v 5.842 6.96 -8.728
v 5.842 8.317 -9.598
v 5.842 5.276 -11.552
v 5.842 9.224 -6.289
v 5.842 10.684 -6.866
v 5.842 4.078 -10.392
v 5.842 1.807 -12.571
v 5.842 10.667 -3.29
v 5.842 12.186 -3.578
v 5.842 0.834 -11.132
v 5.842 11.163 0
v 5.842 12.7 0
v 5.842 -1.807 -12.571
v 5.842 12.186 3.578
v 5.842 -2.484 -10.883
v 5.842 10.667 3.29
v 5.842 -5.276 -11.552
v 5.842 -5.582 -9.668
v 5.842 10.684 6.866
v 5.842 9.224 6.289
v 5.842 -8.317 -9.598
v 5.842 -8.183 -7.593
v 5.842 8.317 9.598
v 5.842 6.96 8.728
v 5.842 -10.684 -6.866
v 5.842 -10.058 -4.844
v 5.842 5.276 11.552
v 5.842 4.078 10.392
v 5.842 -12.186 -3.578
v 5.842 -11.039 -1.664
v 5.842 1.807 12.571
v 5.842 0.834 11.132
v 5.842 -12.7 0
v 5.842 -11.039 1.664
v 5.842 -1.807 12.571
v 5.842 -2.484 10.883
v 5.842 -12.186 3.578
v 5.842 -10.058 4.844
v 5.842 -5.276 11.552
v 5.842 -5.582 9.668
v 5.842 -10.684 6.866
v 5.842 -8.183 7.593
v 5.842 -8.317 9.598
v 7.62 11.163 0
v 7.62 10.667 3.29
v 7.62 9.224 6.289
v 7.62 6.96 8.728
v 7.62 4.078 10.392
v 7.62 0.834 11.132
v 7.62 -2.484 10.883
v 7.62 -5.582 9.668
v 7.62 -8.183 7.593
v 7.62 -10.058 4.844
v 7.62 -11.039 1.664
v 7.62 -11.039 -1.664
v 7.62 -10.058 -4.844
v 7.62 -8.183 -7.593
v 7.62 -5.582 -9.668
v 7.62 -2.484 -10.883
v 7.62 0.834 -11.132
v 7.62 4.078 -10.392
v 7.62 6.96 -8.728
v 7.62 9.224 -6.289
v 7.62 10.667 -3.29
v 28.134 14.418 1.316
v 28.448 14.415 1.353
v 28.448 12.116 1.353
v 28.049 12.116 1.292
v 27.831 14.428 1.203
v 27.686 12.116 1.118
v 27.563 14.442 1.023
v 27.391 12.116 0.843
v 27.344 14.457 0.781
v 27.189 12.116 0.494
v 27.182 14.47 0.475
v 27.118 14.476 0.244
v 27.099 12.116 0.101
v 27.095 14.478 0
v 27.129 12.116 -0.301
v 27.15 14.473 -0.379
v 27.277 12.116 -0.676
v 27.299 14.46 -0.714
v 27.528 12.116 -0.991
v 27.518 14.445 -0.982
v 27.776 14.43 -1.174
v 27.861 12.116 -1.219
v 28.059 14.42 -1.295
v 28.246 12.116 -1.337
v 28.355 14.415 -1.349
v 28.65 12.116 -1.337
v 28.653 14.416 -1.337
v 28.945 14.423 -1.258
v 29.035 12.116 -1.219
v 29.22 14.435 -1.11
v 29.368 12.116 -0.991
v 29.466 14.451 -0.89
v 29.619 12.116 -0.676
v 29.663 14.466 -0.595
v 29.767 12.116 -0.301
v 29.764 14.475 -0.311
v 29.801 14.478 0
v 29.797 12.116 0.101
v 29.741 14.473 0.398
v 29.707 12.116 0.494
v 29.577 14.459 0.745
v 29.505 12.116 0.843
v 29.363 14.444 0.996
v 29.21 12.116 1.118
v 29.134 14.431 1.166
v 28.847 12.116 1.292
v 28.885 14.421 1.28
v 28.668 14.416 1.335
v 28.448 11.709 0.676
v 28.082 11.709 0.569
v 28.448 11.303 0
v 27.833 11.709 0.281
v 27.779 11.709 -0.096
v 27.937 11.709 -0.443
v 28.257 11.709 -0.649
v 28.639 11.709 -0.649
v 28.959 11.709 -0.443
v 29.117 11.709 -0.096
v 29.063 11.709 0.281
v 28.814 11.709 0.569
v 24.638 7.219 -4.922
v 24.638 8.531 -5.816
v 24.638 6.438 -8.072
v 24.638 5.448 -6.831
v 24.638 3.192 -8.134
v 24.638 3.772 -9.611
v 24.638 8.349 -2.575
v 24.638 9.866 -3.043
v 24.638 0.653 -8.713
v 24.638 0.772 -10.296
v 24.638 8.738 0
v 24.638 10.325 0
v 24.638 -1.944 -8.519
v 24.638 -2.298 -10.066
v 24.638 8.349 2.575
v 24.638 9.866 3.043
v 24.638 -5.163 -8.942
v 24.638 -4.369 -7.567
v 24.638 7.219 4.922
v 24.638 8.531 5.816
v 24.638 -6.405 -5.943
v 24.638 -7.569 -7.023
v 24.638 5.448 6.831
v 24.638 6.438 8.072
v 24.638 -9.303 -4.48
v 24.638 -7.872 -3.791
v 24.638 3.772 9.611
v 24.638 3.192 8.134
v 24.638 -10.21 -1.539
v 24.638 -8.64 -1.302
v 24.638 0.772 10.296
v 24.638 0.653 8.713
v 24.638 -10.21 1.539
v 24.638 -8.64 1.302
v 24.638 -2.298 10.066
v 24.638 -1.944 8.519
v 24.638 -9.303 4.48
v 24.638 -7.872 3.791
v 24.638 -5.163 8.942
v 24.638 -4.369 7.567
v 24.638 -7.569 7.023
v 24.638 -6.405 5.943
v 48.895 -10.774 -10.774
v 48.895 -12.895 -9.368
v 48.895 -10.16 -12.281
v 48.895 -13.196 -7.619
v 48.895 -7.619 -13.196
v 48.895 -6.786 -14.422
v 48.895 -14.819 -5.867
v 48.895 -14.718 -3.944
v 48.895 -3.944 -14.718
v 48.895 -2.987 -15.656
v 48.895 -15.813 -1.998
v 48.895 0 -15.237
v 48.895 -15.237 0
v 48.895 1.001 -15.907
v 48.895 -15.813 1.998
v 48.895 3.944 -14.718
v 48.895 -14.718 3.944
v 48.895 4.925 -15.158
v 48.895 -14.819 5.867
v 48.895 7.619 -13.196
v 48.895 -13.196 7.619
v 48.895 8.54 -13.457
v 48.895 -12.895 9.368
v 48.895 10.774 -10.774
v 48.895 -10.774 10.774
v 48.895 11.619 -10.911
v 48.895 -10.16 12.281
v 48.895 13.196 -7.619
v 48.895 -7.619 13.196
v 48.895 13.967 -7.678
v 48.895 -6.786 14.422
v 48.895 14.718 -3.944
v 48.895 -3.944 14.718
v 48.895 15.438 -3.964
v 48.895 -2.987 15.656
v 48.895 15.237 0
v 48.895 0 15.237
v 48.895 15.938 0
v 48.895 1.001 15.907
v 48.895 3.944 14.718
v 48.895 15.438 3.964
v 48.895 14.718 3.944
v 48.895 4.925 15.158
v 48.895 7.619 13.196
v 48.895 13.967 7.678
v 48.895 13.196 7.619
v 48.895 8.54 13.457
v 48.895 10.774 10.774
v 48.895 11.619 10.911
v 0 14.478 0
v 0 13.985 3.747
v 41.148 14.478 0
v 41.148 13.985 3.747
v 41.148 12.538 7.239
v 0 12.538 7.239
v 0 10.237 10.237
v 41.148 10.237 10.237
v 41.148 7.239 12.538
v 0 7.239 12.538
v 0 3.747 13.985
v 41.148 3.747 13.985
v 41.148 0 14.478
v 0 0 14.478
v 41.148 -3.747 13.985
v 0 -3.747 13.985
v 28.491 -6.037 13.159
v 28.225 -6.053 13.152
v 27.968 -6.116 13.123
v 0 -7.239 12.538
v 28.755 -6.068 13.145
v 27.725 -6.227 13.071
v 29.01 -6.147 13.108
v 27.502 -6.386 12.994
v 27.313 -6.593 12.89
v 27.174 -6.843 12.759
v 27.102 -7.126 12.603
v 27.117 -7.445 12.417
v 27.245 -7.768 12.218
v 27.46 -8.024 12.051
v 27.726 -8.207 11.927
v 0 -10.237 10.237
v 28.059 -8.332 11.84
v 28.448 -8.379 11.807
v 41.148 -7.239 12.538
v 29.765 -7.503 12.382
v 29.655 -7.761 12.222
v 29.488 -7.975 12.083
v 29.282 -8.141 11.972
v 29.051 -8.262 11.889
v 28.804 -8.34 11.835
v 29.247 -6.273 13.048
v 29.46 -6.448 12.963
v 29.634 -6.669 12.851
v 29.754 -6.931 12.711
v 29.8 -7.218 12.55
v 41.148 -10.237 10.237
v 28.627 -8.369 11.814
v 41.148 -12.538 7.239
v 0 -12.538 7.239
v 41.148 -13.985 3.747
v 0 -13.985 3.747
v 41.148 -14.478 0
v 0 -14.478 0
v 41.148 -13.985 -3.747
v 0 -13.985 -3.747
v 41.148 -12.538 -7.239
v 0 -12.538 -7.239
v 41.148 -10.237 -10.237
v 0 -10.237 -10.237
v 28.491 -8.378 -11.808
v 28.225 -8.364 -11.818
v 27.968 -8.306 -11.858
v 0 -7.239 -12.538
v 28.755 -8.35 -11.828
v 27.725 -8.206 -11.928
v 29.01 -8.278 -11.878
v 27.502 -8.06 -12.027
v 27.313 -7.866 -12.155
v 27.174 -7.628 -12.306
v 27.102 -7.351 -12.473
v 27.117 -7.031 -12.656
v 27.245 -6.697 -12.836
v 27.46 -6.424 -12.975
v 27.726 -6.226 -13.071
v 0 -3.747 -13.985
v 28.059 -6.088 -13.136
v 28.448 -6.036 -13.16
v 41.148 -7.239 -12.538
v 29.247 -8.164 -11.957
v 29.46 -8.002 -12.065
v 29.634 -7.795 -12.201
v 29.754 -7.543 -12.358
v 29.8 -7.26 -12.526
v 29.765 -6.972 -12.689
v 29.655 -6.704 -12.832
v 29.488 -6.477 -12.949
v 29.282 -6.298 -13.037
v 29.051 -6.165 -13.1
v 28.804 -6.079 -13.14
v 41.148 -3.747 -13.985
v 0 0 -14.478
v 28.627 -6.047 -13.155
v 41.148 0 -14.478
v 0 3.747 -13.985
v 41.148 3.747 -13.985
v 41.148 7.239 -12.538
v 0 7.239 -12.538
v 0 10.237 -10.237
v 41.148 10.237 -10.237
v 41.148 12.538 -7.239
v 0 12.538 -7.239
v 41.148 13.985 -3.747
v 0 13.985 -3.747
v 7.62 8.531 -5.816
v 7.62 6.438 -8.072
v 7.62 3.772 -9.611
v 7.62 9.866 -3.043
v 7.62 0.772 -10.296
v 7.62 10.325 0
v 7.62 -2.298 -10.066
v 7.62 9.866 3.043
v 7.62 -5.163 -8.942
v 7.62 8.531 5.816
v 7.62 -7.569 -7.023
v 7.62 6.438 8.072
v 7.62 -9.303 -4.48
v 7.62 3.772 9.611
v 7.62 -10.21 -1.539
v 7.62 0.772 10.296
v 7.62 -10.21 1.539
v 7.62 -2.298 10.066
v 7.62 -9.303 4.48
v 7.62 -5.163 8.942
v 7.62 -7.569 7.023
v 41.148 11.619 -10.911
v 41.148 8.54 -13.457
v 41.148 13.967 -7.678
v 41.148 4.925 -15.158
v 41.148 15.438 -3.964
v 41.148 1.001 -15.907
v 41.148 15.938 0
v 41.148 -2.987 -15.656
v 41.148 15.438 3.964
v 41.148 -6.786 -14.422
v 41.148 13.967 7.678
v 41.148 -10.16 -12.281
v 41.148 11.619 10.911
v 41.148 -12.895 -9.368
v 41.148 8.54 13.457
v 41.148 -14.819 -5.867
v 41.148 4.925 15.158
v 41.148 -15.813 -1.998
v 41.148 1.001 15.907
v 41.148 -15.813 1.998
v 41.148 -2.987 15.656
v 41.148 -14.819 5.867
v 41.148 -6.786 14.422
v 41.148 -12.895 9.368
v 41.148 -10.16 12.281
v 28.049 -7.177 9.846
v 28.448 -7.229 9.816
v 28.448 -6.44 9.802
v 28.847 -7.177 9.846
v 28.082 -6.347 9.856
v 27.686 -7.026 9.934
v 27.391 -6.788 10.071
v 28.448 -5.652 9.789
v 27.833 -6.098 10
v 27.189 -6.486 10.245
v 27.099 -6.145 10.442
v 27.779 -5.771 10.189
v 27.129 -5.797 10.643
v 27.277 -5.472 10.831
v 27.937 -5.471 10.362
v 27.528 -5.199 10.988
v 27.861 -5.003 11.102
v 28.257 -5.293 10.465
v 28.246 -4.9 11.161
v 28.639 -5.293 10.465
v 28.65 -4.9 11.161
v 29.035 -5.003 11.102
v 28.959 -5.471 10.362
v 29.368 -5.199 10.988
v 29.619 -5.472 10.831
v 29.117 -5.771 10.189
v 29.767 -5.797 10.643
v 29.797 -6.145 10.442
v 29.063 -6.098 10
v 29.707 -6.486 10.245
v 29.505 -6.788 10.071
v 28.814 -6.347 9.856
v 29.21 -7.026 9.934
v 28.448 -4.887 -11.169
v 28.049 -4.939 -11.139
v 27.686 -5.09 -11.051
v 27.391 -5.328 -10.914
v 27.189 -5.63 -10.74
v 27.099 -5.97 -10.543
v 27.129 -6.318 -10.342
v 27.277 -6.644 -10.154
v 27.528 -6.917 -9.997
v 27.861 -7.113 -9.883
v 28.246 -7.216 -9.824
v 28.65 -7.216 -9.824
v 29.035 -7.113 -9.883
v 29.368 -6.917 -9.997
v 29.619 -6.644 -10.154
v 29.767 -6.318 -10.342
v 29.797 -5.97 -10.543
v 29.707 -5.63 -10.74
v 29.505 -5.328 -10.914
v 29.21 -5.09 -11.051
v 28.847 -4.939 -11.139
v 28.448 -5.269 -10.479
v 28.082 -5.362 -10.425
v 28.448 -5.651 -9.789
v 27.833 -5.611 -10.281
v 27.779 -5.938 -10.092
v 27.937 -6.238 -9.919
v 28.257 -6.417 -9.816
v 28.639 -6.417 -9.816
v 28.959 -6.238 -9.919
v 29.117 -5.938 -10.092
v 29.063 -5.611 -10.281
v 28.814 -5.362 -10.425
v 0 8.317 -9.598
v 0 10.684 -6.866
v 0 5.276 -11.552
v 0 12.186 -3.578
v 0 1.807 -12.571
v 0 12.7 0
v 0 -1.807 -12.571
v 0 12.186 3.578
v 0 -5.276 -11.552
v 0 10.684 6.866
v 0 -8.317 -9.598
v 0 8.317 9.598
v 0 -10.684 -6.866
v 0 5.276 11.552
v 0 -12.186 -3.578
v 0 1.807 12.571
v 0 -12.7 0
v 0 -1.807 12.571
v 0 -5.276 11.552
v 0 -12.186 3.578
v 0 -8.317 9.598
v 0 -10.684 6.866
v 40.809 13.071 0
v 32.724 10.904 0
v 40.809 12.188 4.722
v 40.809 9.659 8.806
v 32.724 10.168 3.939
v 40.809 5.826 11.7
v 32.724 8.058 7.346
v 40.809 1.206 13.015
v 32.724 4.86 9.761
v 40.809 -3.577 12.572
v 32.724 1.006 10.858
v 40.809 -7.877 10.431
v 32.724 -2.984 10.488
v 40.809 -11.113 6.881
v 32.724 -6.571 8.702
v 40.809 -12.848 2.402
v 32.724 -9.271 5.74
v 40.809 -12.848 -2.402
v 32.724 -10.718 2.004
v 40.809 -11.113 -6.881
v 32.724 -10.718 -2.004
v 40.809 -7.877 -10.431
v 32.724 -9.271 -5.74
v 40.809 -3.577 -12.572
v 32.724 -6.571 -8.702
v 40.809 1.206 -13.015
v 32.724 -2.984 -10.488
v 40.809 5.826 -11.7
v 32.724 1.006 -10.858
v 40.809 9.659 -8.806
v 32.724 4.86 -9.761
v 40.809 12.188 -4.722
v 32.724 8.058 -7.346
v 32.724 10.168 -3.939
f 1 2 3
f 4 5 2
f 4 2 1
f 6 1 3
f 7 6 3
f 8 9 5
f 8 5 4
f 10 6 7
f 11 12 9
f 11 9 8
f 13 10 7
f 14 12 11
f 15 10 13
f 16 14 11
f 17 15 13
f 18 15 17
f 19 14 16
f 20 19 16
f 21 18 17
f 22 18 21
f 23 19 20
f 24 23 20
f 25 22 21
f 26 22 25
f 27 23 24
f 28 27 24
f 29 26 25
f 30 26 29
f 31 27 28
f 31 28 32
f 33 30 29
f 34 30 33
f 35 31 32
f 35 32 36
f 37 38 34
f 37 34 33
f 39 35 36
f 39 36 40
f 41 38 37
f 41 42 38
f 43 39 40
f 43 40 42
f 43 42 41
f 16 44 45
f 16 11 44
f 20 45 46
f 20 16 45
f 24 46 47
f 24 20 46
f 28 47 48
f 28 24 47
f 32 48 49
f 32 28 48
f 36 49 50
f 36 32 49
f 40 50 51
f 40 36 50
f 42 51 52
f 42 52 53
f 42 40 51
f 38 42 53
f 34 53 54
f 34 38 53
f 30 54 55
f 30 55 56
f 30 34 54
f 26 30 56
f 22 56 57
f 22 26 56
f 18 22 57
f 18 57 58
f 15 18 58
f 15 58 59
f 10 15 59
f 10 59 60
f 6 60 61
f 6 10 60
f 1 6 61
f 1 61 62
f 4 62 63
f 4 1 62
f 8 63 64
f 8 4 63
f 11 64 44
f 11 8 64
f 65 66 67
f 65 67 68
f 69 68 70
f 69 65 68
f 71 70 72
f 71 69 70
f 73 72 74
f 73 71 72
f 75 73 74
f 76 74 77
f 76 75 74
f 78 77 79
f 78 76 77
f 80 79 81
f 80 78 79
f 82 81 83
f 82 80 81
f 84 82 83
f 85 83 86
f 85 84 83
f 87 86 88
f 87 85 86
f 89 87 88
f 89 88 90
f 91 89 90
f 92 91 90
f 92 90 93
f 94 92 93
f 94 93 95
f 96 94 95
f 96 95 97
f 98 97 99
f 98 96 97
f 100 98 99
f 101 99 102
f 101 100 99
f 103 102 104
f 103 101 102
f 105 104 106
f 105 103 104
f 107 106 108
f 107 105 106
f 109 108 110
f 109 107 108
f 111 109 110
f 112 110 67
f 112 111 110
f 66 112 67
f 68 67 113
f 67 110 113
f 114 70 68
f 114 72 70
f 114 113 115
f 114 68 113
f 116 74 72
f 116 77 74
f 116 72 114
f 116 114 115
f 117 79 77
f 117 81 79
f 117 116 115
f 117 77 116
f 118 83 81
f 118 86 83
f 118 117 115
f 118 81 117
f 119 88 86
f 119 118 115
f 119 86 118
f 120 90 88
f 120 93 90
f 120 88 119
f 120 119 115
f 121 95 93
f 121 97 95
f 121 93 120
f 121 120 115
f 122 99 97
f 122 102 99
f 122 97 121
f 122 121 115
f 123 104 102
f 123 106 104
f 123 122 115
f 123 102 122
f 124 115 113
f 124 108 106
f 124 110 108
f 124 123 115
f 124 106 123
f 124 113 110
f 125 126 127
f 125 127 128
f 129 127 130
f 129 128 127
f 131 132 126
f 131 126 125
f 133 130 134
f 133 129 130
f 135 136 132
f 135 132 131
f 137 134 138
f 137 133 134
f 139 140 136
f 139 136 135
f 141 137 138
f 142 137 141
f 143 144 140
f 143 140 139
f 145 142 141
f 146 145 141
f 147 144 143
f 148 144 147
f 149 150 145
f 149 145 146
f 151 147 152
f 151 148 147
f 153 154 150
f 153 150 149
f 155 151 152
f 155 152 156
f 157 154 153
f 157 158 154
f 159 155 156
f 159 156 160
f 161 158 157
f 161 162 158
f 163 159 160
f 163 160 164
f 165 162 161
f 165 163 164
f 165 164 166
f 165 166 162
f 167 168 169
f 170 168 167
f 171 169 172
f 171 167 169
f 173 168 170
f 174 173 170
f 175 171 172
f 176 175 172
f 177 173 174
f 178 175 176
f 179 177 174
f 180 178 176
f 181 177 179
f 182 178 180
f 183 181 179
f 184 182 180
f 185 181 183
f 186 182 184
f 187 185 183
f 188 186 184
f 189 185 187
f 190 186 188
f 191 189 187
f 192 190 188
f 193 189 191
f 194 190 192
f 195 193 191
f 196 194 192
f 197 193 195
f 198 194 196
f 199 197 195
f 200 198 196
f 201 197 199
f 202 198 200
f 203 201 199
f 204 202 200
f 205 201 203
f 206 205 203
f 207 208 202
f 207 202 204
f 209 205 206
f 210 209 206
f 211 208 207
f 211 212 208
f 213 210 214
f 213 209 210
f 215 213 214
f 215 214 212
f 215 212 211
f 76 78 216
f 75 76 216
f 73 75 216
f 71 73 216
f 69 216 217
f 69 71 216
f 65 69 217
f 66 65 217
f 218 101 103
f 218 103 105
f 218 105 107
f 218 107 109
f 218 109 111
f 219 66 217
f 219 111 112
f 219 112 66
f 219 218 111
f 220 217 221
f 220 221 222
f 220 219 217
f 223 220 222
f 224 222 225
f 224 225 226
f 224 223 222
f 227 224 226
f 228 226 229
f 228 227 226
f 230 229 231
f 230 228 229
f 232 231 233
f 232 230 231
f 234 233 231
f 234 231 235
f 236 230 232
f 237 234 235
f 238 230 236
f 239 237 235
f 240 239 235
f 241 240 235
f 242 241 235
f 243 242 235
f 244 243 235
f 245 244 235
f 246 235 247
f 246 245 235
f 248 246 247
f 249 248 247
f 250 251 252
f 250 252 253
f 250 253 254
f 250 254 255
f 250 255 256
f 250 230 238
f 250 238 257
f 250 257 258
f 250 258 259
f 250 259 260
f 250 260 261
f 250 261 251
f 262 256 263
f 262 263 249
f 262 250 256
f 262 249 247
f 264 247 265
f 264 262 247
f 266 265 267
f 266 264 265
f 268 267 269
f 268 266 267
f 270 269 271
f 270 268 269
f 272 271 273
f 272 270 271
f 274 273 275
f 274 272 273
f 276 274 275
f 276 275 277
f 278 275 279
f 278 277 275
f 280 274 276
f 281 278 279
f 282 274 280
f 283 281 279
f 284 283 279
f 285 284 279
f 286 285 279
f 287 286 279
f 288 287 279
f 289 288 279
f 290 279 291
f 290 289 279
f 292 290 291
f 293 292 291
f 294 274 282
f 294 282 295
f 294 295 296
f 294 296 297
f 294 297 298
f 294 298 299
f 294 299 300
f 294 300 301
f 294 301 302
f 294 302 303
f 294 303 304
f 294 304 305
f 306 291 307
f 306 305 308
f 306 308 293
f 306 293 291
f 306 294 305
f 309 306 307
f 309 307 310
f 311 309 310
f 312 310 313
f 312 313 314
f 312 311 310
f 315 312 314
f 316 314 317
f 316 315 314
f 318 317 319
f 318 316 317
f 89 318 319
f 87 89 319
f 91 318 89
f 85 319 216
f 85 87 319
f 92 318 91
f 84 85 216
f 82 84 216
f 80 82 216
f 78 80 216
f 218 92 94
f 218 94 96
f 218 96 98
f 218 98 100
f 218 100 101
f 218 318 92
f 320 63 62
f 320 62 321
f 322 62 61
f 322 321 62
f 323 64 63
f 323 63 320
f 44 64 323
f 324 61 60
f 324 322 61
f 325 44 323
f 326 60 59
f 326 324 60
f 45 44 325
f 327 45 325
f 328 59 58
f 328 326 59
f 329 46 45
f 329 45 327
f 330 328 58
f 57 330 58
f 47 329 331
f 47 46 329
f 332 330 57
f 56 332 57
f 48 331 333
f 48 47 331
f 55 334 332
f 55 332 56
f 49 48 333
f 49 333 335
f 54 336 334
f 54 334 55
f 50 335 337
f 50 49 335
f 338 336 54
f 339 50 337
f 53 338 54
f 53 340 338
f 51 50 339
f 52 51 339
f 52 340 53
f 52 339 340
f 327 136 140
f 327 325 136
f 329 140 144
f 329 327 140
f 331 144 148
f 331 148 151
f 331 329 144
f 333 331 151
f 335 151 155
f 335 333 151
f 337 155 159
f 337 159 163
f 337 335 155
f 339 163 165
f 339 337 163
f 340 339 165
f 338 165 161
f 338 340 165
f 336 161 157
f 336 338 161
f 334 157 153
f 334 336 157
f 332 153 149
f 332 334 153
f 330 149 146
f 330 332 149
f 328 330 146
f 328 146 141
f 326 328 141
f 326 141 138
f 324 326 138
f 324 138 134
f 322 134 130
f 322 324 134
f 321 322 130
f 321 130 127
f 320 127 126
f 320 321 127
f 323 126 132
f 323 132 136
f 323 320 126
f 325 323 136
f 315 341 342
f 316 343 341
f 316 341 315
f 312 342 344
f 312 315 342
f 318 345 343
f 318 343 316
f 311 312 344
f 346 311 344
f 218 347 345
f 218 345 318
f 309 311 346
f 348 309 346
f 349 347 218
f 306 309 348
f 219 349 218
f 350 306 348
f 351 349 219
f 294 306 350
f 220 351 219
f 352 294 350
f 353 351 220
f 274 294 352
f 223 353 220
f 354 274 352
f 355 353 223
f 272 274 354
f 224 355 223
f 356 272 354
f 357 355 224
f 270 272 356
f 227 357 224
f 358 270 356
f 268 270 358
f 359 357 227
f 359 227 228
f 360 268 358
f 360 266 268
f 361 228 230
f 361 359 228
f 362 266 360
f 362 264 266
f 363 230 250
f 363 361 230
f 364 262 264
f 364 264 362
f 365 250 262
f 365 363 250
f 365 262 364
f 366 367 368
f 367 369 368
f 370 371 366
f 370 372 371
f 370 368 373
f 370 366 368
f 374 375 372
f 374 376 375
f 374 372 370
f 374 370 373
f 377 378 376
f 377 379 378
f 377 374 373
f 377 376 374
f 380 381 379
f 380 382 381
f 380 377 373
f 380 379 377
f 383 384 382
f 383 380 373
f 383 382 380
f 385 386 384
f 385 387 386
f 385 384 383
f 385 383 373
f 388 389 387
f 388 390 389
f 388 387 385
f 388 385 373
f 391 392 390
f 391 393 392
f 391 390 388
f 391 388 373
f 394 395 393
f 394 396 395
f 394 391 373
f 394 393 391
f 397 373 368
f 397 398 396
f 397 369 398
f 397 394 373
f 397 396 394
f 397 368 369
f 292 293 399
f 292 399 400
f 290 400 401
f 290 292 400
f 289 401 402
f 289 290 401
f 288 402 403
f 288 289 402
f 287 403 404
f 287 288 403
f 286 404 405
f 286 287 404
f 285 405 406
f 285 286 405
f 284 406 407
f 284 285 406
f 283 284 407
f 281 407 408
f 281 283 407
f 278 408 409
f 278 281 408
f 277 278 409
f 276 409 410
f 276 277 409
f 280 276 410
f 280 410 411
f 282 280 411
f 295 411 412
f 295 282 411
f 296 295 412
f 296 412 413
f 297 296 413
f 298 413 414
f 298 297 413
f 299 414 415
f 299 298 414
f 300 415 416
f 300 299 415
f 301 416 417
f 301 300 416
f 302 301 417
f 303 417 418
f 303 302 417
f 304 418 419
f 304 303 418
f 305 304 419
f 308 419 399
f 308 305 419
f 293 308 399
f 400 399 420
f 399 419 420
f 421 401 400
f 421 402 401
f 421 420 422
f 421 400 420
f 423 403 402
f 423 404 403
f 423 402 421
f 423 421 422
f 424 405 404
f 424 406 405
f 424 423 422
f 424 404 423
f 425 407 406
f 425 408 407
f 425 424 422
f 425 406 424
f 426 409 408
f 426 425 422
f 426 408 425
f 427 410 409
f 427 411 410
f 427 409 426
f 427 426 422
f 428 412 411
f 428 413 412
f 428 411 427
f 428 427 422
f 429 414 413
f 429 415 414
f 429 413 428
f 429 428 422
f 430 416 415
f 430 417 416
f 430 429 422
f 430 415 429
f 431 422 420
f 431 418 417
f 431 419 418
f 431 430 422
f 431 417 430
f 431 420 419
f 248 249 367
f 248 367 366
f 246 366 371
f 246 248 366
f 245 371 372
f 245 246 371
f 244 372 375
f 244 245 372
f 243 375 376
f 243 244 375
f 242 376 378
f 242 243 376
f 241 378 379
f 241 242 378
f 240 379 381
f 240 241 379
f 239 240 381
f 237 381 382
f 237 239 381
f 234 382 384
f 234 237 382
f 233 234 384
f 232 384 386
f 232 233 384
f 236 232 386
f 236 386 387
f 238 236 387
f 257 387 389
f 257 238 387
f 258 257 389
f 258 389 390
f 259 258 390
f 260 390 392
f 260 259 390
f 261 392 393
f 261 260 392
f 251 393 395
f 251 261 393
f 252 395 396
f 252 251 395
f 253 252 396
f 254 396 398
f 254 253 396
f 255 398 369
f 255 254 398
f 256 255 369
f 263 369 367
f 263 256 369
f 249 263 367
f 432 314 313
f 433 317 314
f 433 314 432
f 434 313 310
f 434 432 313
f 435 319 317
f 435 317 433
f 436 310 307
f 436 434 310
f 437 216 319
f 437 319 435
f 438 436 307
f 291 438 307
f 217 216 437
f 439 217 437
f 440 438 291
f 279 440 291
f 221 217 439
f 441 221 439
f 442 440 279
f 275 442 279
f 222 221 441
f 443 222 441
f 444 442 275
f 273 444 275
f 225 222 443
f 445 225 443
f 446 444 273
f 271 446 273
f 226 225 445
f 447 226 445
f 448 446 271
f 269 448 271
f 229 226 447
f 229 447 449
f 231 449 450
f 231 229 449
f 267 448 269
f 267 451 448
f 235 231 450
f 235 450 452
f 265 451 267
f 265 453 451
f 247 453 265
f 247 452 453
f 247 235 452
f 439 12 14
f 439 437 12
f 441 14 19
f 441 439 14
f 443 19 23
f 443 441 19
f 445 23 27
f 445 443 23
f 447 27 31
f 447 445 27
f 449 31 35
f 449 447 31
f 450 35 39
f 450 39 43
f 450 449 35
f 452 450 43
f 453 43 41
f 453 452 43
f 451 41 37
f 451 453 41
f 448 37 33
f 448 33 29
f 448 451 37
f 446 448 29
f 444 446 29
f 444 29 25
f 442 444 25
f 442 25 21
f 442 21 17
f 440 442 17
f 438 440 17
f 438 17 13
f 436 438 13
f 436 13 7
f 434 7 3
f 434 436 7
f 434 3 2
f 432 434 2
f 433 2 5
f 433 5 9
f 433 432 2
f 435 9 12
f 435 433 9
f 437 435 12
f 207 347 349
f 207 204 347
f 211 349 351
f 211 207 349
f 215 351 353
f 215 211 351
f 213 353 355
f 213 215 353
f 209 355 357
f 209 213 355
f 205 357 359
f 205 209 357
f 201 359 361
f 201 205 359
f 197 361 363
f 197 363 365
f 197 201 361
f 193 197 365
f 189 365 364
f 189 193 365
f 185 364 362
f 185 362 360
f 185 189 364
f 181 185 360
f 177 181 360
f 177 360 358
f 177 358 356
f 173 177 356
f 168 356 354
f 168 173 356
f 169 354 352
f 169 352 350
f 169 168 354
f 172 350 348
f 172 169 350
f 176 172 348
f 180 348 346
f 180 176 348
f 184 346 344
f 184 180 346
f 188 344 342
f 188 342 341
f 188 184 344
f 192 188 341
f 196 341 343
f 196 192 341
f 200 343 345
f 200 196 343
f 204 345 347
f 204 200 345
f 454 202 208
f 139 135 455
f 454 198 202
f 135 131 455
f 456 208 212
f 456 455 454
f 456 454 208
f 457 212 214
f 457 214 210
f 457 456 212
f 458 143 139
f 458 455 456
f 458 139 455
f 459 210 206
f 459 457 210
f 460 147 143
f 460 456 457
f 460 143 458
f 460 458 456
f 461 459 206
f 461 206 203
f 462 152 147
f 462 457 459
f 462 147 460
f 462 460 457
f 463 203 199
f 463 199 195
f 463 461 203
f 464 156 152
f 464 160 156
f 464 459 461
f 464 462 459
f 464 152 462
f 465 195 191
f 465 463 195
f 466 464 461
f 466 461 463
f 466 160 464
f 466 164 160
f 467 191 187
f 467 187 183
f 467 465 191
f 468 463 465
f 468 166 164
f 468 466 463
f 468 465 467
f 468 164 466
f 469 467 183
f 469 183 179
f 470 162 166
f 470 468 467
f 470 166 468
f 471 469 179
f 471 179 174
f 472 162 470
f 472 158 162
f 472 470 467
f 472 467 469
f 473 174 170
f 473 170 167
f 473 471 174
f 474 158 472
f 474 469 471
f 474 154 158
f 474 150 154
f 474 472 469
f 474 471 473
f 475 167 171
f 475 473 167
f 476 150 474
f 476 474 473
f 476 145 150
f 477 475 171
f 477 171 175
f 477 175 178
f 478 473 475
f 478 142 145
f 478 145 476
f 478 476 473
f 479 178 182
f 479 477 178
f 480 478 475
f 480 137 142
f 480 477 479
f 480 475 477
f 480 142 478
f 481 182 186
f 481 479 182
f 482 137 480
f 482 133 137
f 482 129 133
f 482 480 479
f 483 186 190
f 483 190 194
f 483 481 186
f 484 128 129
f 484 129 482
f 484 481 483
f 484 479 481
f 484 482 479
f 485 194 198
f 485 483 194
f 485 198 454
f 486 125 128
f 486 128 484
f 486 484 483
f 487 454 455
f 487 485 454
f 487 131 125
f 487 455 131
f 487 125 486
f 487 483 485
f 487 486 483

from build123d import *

# Parameters (mm, degrees)
CIRPATTERN1_COUNT = 3


with BuildPart() as part:
    # Sketch1 → Revolve1 (revolve)
    with BuildSketch(Plane.XY):
        Polygon((0, 14.478), (41.148, 14.478), (41.148, 15.9385), (48.895, 15.9385), (48.895, 15.237243561), (24.638, 8.7376), (24.638, 10.3251), (7.62, 10.3251), (7.62, 11.1633), (5.842, 11.1633), (5.842, 12.7), (0, 12.7), align=None)
    revolve(axis=Axis((0, 0, 0), (1, 0, 0)))

    # Sketch3 → #6-32 Tapped Hole1 (revolve, cut)
    with BuildSketch(Plane(origin=(28.448, 14.478, 0), x_dir=(0, 0, 1), z_dir=(1, 0, 0))):
        Polygon((0, 0), (0, 3.175), (1.35255, 2.36230597), (1.35255, 0), align=None)
    f_6_32_tapped_hole1 = revolve(axis=Axis((28.448, 20.828, 0), (0, -1, 0)), mode=Mode.SUBTRACT)

    # CirPattern1: #6-32 Tapped Hole1 ×3 about axis
    cirpattern1_axis = Axis((0, 0, 0), (-1, 0, 0))
    for i in range(1, CIRPATTERN1_COUNT):
        add(f_6_32_tapped_hole1.rotate(cirpattern1_axis, i * 360 / CIRPATTERN1_COUNT), mode=Mode.SUBTRACT)


solid = part.part
